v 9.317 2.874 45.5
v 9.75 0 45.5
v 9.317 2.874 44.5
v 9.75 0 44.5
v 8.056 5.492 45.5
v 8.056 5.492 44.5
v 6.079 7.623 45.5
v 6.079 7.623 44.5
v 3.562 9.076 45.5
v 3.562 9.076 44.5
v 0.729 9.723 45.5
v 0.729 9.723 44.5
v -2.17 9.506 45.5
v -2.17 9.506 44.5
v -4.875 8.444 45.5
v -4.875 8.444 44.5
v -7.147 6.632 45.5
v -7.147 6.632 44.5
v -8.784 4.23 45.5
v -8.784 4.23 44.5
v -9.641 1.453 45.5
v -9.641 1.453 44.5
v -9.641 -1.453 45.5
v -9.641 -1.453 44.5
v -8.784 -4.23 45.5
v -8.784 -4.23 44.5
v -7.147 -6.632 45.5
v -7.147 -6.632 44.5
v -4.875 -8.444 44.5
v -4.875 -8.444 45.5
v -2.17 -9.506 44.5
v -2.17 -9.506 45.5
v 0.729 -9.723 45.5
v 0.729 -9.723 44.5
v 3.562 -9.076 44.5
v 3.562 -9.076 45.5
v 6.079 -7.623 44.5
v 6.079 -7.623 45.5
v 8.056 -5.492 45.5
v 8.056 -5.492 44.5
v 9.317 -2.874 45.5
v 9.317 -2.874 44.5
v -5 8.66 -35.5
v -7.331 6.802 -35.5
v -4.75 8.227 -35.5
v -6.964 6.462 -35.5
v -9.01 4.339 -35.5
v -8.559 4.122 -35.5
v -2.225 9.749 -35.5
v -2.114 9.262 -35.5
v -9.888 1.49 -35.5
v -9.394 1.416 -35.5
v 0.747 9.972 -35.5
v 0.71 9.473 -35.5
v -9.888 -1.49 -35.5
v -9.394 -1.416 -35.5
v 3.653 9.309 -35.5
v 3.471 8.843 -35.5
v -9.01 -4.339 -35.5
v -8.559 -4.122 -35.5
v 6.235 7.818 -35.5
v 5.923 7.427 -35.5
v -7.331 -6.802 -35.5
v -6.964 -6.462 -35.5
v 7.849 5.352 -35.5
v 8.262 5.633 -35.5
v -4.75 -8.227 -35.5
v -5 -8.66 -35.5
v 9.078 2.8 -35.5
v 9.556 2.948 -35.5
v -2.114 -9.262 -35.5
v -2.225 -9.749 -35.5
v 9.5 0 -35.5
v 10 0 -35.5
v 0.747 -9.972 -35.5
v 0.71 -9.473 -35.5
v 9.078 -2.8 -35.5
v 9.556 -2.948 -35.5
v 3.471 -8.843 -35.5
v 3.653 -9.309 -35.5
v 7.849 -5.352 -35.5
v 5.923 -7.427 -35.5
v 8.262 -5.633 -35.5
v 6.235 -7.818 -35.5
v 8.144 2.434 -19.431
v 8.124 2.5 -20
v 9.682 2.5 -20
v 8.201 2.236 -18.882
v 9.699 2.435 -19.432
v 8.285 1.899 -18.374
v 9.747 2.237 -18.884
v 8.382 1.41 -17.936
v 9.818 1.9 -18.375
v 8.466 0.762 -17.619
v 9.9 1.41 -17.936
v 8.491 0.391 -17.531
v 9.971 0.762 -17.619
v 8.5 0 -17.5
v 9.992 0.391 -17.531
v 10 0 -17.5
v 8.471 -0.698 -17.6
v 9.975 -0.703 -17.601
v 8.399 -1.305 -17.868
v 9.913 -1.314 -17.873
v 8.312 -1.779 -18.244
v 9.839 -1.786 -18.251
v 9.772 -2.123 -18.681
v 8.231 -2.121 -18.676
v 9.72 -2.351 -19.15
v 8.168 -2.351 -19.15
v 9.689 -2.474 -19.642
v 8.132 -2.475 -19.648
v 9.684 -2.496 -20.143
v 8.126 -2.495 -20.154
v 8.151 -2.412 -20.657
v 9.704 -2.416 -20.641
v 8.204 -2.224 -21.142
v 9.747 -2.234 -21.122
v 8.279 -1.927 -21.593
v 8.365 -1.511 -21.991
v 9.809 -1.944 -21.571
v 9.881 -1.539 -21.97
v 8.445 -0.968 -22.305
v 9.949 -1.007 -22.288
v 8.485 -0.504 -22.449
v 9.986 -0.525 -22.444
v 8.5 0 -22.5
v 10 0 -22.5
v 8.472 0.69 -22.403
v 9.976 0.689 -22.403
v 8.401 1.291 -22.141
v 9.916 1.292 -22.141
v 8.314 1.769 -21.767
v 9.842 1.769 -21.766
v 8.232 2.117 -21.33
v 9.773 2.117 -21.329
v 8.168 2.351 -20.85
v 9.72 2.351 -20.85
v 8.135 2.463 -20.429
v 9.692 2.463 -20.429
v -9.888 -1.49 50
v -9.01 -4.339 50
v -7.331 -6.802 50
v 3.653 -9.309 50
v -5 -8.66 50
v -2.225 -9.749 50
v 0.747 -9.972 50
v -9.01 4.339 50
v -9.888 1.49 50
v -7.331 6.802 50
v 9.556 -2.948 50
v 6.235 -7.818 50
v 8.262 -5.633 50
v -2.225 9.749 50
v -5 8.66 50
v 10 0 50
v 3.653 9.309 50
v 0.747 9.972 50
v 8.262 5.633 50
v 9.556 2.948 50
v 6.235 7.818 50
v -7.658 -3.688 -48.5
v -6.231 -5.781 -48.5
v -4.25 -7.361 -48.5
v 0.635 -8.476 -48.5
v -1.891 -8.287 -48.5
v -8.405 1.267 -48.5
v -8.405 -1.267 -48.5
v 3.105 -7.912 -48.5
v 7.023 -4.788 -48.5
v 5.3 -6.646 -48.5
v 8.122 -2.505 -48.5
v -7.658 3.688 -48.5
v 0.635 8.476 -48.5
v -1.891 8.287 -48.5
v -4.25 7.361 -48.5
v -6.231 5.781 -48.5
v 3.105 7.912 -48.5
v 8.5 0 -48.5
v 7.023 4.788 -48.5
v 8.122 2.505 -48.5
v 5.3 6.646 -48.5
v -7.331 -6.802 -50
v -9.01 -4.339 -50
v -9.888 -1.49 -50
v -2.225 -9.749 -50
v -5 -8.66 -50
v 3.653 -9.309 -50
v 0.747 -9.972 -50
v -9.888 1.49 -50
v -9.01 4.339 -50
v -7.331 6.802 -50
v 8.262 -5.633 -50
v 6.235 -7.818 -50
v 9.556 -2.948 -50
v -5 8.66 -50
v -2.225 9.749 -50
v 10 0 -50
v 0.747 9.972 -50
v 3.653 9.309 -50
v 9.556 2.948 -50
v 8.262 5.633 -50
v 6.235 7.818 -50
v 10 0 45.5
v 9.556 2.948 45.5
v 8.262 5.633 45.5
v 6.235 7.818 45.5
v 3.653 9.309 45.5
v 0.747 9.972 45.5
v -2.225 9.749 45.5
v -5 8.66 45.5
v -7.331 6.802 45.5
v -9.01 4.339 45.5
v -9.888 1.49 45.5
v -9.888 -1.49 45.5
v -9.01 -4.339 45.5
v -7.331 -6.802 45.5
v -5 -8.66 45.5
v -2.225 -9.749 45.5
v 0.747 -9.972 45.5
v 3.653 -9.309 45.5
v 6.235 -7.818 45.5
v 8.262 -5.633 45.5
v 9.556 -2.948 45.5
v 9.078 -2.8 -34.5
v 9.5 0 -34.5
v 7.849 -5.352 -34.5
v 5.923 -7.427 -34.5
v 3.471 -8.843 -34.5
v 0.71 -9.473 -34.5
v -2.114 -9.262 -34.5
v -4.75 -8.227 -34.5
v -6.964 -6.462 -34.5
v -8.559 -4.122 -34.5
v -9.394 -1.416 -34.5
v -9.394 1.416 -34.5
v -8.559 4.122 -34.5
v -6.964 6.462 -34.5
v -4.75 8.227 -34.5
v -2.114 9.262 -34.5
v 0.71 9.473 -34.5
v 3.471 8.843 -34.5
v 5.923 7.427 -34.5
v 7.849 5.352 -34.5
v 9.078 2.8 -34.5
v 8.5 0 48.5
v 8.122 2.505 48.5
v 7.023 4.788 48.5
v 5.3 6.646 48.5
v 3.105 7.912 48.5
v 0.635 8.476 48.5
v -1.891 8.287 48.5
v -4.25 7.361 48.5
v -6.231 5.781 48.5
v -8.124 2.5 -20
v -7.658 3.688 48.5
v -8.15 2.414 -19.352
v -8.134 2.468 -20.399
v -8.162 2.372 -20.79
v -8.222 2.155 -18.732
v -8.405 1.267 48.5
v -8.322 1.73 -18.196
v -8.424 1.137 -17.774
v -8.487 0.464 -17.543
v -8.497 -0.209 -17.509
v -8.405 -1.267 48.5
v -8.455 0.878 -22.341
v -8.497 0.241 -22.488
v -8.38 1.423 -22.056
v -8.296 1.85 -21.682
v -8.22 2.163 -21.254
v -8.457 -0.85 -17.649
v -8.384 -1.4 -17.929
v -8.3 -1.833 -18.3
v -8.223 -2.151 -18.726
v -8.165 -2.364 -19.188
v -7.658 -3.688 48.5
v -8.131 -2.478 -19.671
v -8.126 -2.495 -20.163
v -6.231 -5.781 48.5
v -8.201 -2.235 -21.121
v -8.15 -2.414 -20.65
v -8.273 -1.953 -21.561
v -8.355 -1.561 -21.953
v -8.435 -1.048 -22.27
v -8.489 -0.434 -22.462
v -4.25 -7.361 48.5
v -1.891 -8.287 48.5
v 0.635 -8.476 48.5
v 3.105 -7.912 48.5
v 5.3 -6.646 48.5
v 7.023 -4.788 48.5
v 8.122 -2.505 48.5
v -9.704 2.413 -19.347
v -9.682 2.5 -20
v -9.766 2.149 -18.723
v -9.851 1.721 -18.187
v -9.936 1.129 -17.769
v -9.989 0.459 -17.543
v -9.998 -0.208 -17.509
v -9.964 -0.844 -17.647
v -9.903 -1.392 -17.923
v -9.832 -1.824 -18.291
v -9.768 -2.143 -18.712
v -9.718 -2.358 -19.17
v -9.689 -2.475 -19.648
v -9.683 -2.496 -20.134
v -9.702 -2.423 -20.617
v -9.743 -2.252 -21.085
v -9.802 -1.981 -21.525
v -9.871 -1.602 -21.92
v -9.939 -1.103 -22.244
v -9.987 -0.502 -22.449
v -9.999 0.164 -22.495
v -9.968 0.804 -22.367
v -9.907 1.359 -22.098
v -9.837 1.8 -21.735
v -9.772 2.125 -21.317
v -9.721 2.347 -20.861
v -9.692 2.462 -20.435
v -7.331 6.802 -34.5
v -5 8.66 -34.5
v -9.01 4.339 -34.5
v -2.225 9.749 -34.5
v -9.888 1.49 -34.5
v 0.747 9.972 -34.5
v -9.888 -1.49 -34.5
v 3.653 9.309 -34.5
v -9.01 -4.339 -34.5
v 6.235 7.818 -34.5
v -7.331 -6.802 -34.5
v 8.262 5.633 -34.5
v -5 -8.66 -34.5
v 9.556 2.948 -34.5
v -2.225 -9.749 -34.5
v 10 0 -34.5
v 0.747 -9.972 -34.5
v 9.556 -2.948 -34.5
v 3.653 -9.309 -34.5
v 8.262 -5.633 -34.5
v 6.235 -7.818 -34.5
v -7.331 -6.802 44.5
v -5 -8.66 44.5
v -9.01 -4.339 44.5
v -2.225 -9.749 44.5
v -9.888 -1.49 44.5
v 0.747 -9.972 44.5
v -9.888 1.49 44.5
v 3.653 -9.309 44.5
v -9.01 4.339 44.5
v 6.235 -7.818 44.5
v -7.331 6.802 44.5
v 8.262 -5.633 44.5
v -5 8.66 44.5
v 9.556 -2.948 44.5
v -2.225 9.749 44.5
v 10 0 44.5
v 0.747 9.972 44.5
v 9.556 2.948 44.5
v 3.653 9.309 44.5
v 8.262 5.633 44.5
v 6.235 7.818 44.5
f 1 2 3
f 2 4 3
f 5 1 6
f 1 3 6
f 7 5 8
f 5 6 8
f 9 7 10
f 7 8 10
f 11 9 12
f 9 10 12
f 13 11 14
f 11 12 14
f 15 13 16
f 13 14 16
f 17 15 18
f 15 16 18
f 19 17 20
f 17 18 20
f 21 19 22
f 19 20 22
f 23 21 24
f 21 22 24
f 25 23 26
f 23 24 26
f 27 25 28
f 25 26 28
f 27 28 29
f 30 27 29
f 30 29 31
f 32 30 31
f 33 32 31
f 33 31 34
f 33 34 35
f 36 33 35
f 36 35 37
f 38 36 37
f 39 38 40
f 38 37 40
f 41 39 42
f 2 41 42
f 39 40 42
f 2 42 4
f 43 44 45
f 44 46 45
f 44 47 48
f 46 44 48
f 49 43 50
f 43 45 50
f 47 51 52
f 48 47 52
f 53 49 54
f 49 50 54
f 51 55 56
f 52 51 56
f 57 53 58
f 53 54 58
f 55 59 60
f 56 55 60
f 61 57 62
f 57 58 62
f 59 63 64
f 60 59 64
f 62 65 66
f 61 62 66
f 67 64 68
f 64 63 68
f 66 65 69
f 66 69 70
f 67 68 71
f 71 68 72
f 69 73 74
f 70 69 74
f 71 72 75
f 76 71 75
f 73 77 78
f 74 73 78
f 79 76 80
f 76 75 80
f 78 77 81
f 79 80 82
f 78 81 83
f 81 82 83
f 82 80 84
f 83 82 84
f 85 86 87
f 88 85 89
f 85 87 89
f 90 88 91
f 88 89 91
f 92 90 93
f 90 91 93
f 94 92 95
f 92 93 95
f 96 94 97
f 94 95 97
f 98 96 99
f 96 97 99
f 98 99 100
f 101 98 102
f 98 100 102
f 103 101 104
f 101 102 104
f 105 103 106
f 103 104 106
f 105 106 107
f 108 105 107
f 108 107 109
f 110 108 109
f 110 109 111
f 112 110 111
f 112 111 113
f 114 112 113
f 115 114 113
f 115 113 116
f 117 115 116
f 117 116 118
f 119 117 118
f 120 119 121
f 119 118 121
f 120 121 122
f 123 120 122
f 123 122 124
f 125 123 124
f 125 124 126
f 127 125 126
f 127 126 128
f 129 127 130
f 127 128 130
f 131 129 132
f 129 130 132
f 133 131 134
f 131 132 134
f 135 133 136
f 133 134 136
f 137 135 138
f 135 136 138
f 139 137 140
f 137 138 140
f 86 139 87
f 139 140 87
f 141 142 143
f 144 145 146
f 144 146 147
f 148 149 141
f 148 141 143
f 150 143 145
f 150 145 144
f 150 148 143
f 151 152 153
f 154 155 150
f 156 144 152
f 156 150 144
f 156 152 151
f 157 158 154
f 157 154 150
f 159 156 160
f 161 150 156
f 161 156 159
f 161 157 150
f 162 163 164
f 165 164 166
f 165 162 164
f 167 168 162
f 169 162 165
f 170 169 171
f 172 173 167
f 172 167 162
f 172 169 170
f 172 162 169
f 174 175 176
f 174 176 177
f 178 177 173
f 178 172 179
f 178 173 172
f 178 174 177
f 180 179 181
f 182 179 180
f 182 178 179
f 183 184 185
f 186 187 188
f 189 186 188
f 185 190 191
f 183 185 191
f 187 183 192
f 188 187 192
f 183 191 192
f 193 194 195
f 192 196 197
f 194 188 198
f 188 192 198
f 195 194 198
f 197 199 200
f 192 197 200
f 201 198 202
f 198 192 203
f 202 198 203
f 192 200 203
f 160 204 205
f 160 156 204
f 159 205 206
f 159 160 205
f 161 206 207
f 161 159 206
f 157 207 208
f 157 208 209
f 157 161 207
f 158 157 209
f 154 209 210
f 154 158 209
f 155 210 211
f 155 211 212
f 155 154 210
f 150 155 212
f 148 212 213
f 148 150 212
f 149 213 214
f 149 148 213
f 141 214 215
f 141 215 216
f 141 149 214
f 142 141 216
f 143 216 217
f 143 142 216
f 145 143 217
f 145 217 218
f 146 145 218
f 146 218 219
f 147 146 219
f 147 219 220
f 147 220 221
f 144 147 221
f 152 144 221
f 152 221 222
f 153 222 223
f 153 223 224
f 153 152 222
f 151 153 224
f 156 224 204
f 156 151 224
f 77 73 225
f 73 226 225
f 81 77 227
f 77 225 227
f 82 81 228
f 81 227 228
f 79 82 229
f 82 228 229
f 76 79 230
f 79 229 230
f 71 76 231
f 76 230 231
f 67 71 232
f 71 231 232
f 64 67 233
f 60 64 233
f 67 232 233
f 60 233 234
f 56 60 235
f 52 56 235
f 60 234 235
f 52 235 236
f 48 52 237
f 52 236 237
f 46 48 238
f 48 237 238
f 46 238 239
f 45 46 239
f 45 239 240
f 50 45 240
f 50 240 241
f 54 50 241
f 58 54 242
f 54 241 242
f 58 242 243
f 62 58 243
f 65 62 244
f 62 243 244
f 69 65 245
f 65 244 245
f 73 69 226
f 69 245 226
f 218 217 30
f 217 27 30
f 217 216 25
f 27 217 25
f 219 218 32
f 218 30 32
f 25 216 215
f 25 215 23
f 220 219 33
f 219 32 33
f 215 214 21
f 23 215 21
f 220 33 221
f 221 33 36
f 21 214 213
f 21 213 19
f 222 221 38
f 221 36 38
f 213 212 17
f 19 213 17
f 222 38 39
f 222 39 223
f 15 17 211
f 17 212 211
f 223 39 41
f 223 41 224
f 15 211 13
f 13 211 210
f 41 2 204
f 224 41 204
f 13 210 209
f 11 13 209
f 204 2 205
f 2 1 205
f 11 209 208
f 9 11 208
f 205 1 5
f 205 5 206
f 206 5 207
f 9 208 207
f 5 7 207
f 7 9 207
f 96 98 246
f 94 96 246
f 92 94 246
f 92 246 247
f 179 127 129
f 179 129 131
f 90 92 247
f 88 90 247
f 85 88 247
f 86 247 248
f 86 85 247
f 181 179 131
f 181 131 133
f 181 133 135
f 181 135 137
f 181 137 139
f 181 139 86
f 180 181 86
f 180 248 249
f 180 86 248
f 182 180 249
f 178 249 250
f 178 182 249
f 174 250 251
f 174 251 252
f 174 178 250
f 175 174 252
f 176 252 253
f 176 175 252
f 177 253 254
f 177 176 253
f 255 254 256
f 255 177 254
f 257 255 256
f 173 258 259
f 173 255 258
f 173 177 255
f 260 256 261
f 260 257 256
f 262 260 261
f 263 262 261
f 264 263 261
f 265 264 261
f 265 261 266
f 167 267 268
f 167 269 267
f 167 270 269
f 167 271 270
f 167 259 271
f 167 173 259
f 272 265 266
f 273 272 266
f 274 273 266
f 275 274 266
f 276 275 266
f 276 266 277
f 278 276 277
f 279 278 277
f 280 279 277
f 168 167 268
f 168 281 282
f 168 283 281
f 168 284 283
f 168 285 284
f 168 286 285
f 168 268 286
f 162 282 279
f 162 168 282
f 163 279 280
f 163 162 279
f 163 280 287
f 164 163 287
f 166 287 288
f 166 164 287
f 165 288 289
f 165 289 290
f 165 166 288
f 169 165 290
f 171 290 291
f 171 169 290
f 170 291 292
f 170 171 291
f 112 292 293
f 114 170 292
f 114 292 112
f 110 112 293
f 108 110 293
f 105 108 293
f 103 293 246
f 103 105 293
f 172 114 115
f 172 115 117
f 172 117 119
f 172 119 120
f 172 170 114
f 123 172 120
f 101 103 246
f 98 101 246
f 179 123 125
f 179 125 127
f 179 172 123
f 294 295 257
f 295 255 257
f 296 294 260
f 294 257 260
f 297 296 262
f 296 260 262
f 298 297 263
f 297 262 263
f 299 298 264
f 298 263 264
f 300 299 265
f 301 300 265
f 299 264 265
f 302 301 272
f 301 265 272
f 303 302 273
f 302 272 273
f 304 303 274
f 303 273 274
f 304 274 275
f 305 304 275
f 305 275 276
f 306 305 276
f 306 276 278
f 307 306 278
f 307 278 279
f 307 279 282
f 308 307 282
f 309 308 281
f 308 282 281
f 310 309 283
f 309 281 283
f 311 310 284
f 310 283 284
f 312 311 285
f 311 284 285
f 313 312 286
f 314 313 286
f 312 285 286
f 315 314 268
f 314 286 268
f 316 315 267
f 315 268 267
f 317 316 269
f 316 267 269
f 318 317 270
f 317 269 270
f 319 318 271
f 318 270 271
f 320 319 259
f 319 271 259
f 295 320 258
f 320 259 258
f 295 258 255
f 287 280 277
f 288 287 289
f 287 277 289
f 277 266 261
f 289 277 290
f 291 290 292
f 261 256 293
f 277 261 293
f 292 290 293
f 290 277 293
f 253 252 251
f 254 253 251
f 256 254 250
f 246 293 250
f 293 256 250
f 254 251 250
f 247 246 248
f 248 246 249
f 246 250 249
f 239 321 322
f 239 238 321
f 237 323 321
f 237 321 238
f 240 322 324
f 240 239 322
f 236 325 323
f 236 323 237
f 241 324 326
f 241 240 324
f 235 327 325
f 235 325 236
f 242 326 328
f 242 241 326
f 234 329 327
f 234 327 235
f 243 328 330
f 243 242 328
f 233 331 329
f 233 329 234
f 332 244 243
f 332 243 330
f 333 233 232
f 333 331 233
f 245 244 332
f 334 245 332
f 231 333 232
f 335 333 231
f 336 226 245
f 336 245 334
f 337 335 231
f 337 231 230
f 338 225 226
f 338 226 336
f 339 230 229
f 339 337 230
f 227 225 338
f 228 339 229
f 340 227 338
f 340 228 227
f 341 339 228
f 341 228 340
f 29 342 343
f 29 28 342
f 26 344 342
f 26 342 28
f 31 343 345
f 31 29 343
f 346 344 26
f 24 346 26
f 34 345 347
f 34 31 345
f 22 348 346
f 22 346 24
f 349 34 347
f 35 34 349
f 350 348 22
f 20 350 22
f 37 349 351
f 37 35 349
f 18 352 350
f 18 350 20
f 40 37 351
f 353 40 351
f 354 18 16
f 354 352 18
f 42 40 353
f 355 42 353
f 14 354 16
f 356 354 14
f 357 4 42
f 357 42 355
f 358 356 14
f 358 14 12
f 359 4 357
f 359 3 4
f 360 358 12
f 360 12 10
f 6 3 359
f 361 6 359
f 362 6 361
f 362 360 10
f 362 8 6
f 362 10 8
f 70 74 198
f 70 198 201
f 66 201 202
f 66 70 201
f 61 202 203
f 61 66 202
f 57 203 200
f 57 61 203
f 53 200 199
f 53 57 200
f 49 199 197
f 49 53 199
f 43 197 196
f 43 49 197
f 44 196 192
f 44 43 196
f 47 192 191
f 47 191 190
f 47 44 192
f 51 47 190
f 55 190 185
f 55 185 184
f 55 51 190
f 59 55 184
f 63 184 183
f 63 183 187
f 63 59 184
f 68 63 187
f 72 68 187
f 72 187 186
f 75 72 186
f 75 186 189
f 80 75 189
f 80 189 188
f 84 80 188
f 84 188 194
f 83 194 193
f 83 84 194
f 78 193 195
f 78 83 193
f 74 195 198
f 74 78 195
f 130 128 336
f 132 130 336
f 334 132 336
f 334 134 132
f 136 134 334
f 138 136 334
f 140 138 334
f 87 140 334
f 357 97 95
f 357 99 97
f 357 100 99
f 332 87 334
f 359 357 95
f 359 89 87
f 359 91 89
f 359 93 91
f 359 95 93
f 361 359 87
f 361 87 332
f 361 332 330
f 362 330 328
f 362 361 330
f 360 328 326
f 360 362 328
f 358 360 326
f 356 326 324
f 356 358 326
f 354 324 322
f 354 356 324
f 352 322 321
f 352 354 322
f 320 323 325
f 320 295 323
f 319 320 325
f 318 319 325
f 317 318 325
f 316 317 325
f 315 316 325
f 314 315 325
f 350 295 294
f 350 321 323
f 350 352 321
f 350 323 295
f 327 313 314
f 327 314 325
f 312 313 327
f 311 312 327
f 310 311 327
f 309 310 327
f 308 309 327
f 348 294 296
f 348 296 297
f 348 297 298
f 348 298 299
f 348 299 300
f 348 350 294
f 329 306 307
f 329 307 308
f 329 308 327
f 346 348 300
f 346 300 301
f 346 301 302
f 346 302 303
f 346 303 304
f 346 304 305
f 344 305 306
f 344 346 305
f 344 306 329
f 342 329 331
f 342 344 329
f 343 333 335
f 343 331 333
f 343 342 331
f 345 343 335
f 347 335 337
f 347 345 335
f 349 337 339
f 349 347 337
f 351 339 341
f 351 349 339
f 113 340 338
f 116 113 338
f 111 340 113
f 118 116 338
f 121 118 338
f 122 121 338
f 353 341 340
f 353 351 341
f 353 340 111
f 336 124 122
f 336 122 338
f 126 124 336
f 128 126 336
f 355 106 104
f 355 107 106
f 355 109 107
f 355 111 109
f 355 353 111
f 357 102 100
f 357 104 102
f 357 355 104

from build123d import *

# Parameters (mm, degrees)
F0_R      = 10
F0_R_2    = 8.5
F1_DEPTH  = 50
F2_R      = 8.5
F3_DEPTH  = 1.5
F4_R      = 2.5
F5_DEPTH  = 12.5
F7_R      = 10
F7_R_2    = 9.75
F8_DEPTH  = 0.5
F10_R     = 10
F10_R_2   = 9.5
F11_DEPTH = 0.5


# Not quite as in the source:
# - a pattern or mirror of a feature is missing from the dataset's text; its kind, count and spacing are read off the source's solid


with BuildPart() as f1:
    # F0 (on Top) → F1 (new body, symmetric)
    with BuildSketch(Plane.XY):
        Circle(F0_R)
        Circle(F0_R_2, mode=Mode.SUBTRACT)
    extrude(amount=F1_DEPTH, both=True)

    # F2 (on face) → F3 (join)
    with BuildSketch(Plane.XY.offset(50)):
        Circle(F2_R)
    f3 = extrude(amount=-F3_DEPTH)

    # F3_copies: F3 across plane
    add(f3.mirror(Plane(origin=(0, 0, 0), x_dir=(-1, 0, 0), z_dir=(0, 0, -1))))

    # F4 (on Right) → F5 (cut, symmetric)
    with BuildSketch(Plane.YZ):
        with Locations((0, -20)):
            Circle(F4_R)
    extrude(amount=F5_DEPTH, both=True, mode=Mode.SUBTRACT)

    # F7 (on offset) → F8 (cut, symmetric)
    with BuildSketch(Plane.XY.offset(45)):
        Circle(F7_R)
        Circle(F7_R_2, mode=Mode.SUBTRACT)
    extrude(amount=F8_DEPTH, both=True, mode=Mode.SUBTRACT)

    # F10 (on face) → F11 (cut, symmetric)
    with BuildSketch(Plane(origin=(0, 0, -35), x_dir=(1, 0, 0), z_dir=(0, 0, -1))):
        Circle(F10_R)
        Circle(F10_R_2, mode=Mode.SUBTRACT)
    extrude(amount=F11_DEPTH, both=True, mode=Mode.SUBTRACT)


solid = f1.part
